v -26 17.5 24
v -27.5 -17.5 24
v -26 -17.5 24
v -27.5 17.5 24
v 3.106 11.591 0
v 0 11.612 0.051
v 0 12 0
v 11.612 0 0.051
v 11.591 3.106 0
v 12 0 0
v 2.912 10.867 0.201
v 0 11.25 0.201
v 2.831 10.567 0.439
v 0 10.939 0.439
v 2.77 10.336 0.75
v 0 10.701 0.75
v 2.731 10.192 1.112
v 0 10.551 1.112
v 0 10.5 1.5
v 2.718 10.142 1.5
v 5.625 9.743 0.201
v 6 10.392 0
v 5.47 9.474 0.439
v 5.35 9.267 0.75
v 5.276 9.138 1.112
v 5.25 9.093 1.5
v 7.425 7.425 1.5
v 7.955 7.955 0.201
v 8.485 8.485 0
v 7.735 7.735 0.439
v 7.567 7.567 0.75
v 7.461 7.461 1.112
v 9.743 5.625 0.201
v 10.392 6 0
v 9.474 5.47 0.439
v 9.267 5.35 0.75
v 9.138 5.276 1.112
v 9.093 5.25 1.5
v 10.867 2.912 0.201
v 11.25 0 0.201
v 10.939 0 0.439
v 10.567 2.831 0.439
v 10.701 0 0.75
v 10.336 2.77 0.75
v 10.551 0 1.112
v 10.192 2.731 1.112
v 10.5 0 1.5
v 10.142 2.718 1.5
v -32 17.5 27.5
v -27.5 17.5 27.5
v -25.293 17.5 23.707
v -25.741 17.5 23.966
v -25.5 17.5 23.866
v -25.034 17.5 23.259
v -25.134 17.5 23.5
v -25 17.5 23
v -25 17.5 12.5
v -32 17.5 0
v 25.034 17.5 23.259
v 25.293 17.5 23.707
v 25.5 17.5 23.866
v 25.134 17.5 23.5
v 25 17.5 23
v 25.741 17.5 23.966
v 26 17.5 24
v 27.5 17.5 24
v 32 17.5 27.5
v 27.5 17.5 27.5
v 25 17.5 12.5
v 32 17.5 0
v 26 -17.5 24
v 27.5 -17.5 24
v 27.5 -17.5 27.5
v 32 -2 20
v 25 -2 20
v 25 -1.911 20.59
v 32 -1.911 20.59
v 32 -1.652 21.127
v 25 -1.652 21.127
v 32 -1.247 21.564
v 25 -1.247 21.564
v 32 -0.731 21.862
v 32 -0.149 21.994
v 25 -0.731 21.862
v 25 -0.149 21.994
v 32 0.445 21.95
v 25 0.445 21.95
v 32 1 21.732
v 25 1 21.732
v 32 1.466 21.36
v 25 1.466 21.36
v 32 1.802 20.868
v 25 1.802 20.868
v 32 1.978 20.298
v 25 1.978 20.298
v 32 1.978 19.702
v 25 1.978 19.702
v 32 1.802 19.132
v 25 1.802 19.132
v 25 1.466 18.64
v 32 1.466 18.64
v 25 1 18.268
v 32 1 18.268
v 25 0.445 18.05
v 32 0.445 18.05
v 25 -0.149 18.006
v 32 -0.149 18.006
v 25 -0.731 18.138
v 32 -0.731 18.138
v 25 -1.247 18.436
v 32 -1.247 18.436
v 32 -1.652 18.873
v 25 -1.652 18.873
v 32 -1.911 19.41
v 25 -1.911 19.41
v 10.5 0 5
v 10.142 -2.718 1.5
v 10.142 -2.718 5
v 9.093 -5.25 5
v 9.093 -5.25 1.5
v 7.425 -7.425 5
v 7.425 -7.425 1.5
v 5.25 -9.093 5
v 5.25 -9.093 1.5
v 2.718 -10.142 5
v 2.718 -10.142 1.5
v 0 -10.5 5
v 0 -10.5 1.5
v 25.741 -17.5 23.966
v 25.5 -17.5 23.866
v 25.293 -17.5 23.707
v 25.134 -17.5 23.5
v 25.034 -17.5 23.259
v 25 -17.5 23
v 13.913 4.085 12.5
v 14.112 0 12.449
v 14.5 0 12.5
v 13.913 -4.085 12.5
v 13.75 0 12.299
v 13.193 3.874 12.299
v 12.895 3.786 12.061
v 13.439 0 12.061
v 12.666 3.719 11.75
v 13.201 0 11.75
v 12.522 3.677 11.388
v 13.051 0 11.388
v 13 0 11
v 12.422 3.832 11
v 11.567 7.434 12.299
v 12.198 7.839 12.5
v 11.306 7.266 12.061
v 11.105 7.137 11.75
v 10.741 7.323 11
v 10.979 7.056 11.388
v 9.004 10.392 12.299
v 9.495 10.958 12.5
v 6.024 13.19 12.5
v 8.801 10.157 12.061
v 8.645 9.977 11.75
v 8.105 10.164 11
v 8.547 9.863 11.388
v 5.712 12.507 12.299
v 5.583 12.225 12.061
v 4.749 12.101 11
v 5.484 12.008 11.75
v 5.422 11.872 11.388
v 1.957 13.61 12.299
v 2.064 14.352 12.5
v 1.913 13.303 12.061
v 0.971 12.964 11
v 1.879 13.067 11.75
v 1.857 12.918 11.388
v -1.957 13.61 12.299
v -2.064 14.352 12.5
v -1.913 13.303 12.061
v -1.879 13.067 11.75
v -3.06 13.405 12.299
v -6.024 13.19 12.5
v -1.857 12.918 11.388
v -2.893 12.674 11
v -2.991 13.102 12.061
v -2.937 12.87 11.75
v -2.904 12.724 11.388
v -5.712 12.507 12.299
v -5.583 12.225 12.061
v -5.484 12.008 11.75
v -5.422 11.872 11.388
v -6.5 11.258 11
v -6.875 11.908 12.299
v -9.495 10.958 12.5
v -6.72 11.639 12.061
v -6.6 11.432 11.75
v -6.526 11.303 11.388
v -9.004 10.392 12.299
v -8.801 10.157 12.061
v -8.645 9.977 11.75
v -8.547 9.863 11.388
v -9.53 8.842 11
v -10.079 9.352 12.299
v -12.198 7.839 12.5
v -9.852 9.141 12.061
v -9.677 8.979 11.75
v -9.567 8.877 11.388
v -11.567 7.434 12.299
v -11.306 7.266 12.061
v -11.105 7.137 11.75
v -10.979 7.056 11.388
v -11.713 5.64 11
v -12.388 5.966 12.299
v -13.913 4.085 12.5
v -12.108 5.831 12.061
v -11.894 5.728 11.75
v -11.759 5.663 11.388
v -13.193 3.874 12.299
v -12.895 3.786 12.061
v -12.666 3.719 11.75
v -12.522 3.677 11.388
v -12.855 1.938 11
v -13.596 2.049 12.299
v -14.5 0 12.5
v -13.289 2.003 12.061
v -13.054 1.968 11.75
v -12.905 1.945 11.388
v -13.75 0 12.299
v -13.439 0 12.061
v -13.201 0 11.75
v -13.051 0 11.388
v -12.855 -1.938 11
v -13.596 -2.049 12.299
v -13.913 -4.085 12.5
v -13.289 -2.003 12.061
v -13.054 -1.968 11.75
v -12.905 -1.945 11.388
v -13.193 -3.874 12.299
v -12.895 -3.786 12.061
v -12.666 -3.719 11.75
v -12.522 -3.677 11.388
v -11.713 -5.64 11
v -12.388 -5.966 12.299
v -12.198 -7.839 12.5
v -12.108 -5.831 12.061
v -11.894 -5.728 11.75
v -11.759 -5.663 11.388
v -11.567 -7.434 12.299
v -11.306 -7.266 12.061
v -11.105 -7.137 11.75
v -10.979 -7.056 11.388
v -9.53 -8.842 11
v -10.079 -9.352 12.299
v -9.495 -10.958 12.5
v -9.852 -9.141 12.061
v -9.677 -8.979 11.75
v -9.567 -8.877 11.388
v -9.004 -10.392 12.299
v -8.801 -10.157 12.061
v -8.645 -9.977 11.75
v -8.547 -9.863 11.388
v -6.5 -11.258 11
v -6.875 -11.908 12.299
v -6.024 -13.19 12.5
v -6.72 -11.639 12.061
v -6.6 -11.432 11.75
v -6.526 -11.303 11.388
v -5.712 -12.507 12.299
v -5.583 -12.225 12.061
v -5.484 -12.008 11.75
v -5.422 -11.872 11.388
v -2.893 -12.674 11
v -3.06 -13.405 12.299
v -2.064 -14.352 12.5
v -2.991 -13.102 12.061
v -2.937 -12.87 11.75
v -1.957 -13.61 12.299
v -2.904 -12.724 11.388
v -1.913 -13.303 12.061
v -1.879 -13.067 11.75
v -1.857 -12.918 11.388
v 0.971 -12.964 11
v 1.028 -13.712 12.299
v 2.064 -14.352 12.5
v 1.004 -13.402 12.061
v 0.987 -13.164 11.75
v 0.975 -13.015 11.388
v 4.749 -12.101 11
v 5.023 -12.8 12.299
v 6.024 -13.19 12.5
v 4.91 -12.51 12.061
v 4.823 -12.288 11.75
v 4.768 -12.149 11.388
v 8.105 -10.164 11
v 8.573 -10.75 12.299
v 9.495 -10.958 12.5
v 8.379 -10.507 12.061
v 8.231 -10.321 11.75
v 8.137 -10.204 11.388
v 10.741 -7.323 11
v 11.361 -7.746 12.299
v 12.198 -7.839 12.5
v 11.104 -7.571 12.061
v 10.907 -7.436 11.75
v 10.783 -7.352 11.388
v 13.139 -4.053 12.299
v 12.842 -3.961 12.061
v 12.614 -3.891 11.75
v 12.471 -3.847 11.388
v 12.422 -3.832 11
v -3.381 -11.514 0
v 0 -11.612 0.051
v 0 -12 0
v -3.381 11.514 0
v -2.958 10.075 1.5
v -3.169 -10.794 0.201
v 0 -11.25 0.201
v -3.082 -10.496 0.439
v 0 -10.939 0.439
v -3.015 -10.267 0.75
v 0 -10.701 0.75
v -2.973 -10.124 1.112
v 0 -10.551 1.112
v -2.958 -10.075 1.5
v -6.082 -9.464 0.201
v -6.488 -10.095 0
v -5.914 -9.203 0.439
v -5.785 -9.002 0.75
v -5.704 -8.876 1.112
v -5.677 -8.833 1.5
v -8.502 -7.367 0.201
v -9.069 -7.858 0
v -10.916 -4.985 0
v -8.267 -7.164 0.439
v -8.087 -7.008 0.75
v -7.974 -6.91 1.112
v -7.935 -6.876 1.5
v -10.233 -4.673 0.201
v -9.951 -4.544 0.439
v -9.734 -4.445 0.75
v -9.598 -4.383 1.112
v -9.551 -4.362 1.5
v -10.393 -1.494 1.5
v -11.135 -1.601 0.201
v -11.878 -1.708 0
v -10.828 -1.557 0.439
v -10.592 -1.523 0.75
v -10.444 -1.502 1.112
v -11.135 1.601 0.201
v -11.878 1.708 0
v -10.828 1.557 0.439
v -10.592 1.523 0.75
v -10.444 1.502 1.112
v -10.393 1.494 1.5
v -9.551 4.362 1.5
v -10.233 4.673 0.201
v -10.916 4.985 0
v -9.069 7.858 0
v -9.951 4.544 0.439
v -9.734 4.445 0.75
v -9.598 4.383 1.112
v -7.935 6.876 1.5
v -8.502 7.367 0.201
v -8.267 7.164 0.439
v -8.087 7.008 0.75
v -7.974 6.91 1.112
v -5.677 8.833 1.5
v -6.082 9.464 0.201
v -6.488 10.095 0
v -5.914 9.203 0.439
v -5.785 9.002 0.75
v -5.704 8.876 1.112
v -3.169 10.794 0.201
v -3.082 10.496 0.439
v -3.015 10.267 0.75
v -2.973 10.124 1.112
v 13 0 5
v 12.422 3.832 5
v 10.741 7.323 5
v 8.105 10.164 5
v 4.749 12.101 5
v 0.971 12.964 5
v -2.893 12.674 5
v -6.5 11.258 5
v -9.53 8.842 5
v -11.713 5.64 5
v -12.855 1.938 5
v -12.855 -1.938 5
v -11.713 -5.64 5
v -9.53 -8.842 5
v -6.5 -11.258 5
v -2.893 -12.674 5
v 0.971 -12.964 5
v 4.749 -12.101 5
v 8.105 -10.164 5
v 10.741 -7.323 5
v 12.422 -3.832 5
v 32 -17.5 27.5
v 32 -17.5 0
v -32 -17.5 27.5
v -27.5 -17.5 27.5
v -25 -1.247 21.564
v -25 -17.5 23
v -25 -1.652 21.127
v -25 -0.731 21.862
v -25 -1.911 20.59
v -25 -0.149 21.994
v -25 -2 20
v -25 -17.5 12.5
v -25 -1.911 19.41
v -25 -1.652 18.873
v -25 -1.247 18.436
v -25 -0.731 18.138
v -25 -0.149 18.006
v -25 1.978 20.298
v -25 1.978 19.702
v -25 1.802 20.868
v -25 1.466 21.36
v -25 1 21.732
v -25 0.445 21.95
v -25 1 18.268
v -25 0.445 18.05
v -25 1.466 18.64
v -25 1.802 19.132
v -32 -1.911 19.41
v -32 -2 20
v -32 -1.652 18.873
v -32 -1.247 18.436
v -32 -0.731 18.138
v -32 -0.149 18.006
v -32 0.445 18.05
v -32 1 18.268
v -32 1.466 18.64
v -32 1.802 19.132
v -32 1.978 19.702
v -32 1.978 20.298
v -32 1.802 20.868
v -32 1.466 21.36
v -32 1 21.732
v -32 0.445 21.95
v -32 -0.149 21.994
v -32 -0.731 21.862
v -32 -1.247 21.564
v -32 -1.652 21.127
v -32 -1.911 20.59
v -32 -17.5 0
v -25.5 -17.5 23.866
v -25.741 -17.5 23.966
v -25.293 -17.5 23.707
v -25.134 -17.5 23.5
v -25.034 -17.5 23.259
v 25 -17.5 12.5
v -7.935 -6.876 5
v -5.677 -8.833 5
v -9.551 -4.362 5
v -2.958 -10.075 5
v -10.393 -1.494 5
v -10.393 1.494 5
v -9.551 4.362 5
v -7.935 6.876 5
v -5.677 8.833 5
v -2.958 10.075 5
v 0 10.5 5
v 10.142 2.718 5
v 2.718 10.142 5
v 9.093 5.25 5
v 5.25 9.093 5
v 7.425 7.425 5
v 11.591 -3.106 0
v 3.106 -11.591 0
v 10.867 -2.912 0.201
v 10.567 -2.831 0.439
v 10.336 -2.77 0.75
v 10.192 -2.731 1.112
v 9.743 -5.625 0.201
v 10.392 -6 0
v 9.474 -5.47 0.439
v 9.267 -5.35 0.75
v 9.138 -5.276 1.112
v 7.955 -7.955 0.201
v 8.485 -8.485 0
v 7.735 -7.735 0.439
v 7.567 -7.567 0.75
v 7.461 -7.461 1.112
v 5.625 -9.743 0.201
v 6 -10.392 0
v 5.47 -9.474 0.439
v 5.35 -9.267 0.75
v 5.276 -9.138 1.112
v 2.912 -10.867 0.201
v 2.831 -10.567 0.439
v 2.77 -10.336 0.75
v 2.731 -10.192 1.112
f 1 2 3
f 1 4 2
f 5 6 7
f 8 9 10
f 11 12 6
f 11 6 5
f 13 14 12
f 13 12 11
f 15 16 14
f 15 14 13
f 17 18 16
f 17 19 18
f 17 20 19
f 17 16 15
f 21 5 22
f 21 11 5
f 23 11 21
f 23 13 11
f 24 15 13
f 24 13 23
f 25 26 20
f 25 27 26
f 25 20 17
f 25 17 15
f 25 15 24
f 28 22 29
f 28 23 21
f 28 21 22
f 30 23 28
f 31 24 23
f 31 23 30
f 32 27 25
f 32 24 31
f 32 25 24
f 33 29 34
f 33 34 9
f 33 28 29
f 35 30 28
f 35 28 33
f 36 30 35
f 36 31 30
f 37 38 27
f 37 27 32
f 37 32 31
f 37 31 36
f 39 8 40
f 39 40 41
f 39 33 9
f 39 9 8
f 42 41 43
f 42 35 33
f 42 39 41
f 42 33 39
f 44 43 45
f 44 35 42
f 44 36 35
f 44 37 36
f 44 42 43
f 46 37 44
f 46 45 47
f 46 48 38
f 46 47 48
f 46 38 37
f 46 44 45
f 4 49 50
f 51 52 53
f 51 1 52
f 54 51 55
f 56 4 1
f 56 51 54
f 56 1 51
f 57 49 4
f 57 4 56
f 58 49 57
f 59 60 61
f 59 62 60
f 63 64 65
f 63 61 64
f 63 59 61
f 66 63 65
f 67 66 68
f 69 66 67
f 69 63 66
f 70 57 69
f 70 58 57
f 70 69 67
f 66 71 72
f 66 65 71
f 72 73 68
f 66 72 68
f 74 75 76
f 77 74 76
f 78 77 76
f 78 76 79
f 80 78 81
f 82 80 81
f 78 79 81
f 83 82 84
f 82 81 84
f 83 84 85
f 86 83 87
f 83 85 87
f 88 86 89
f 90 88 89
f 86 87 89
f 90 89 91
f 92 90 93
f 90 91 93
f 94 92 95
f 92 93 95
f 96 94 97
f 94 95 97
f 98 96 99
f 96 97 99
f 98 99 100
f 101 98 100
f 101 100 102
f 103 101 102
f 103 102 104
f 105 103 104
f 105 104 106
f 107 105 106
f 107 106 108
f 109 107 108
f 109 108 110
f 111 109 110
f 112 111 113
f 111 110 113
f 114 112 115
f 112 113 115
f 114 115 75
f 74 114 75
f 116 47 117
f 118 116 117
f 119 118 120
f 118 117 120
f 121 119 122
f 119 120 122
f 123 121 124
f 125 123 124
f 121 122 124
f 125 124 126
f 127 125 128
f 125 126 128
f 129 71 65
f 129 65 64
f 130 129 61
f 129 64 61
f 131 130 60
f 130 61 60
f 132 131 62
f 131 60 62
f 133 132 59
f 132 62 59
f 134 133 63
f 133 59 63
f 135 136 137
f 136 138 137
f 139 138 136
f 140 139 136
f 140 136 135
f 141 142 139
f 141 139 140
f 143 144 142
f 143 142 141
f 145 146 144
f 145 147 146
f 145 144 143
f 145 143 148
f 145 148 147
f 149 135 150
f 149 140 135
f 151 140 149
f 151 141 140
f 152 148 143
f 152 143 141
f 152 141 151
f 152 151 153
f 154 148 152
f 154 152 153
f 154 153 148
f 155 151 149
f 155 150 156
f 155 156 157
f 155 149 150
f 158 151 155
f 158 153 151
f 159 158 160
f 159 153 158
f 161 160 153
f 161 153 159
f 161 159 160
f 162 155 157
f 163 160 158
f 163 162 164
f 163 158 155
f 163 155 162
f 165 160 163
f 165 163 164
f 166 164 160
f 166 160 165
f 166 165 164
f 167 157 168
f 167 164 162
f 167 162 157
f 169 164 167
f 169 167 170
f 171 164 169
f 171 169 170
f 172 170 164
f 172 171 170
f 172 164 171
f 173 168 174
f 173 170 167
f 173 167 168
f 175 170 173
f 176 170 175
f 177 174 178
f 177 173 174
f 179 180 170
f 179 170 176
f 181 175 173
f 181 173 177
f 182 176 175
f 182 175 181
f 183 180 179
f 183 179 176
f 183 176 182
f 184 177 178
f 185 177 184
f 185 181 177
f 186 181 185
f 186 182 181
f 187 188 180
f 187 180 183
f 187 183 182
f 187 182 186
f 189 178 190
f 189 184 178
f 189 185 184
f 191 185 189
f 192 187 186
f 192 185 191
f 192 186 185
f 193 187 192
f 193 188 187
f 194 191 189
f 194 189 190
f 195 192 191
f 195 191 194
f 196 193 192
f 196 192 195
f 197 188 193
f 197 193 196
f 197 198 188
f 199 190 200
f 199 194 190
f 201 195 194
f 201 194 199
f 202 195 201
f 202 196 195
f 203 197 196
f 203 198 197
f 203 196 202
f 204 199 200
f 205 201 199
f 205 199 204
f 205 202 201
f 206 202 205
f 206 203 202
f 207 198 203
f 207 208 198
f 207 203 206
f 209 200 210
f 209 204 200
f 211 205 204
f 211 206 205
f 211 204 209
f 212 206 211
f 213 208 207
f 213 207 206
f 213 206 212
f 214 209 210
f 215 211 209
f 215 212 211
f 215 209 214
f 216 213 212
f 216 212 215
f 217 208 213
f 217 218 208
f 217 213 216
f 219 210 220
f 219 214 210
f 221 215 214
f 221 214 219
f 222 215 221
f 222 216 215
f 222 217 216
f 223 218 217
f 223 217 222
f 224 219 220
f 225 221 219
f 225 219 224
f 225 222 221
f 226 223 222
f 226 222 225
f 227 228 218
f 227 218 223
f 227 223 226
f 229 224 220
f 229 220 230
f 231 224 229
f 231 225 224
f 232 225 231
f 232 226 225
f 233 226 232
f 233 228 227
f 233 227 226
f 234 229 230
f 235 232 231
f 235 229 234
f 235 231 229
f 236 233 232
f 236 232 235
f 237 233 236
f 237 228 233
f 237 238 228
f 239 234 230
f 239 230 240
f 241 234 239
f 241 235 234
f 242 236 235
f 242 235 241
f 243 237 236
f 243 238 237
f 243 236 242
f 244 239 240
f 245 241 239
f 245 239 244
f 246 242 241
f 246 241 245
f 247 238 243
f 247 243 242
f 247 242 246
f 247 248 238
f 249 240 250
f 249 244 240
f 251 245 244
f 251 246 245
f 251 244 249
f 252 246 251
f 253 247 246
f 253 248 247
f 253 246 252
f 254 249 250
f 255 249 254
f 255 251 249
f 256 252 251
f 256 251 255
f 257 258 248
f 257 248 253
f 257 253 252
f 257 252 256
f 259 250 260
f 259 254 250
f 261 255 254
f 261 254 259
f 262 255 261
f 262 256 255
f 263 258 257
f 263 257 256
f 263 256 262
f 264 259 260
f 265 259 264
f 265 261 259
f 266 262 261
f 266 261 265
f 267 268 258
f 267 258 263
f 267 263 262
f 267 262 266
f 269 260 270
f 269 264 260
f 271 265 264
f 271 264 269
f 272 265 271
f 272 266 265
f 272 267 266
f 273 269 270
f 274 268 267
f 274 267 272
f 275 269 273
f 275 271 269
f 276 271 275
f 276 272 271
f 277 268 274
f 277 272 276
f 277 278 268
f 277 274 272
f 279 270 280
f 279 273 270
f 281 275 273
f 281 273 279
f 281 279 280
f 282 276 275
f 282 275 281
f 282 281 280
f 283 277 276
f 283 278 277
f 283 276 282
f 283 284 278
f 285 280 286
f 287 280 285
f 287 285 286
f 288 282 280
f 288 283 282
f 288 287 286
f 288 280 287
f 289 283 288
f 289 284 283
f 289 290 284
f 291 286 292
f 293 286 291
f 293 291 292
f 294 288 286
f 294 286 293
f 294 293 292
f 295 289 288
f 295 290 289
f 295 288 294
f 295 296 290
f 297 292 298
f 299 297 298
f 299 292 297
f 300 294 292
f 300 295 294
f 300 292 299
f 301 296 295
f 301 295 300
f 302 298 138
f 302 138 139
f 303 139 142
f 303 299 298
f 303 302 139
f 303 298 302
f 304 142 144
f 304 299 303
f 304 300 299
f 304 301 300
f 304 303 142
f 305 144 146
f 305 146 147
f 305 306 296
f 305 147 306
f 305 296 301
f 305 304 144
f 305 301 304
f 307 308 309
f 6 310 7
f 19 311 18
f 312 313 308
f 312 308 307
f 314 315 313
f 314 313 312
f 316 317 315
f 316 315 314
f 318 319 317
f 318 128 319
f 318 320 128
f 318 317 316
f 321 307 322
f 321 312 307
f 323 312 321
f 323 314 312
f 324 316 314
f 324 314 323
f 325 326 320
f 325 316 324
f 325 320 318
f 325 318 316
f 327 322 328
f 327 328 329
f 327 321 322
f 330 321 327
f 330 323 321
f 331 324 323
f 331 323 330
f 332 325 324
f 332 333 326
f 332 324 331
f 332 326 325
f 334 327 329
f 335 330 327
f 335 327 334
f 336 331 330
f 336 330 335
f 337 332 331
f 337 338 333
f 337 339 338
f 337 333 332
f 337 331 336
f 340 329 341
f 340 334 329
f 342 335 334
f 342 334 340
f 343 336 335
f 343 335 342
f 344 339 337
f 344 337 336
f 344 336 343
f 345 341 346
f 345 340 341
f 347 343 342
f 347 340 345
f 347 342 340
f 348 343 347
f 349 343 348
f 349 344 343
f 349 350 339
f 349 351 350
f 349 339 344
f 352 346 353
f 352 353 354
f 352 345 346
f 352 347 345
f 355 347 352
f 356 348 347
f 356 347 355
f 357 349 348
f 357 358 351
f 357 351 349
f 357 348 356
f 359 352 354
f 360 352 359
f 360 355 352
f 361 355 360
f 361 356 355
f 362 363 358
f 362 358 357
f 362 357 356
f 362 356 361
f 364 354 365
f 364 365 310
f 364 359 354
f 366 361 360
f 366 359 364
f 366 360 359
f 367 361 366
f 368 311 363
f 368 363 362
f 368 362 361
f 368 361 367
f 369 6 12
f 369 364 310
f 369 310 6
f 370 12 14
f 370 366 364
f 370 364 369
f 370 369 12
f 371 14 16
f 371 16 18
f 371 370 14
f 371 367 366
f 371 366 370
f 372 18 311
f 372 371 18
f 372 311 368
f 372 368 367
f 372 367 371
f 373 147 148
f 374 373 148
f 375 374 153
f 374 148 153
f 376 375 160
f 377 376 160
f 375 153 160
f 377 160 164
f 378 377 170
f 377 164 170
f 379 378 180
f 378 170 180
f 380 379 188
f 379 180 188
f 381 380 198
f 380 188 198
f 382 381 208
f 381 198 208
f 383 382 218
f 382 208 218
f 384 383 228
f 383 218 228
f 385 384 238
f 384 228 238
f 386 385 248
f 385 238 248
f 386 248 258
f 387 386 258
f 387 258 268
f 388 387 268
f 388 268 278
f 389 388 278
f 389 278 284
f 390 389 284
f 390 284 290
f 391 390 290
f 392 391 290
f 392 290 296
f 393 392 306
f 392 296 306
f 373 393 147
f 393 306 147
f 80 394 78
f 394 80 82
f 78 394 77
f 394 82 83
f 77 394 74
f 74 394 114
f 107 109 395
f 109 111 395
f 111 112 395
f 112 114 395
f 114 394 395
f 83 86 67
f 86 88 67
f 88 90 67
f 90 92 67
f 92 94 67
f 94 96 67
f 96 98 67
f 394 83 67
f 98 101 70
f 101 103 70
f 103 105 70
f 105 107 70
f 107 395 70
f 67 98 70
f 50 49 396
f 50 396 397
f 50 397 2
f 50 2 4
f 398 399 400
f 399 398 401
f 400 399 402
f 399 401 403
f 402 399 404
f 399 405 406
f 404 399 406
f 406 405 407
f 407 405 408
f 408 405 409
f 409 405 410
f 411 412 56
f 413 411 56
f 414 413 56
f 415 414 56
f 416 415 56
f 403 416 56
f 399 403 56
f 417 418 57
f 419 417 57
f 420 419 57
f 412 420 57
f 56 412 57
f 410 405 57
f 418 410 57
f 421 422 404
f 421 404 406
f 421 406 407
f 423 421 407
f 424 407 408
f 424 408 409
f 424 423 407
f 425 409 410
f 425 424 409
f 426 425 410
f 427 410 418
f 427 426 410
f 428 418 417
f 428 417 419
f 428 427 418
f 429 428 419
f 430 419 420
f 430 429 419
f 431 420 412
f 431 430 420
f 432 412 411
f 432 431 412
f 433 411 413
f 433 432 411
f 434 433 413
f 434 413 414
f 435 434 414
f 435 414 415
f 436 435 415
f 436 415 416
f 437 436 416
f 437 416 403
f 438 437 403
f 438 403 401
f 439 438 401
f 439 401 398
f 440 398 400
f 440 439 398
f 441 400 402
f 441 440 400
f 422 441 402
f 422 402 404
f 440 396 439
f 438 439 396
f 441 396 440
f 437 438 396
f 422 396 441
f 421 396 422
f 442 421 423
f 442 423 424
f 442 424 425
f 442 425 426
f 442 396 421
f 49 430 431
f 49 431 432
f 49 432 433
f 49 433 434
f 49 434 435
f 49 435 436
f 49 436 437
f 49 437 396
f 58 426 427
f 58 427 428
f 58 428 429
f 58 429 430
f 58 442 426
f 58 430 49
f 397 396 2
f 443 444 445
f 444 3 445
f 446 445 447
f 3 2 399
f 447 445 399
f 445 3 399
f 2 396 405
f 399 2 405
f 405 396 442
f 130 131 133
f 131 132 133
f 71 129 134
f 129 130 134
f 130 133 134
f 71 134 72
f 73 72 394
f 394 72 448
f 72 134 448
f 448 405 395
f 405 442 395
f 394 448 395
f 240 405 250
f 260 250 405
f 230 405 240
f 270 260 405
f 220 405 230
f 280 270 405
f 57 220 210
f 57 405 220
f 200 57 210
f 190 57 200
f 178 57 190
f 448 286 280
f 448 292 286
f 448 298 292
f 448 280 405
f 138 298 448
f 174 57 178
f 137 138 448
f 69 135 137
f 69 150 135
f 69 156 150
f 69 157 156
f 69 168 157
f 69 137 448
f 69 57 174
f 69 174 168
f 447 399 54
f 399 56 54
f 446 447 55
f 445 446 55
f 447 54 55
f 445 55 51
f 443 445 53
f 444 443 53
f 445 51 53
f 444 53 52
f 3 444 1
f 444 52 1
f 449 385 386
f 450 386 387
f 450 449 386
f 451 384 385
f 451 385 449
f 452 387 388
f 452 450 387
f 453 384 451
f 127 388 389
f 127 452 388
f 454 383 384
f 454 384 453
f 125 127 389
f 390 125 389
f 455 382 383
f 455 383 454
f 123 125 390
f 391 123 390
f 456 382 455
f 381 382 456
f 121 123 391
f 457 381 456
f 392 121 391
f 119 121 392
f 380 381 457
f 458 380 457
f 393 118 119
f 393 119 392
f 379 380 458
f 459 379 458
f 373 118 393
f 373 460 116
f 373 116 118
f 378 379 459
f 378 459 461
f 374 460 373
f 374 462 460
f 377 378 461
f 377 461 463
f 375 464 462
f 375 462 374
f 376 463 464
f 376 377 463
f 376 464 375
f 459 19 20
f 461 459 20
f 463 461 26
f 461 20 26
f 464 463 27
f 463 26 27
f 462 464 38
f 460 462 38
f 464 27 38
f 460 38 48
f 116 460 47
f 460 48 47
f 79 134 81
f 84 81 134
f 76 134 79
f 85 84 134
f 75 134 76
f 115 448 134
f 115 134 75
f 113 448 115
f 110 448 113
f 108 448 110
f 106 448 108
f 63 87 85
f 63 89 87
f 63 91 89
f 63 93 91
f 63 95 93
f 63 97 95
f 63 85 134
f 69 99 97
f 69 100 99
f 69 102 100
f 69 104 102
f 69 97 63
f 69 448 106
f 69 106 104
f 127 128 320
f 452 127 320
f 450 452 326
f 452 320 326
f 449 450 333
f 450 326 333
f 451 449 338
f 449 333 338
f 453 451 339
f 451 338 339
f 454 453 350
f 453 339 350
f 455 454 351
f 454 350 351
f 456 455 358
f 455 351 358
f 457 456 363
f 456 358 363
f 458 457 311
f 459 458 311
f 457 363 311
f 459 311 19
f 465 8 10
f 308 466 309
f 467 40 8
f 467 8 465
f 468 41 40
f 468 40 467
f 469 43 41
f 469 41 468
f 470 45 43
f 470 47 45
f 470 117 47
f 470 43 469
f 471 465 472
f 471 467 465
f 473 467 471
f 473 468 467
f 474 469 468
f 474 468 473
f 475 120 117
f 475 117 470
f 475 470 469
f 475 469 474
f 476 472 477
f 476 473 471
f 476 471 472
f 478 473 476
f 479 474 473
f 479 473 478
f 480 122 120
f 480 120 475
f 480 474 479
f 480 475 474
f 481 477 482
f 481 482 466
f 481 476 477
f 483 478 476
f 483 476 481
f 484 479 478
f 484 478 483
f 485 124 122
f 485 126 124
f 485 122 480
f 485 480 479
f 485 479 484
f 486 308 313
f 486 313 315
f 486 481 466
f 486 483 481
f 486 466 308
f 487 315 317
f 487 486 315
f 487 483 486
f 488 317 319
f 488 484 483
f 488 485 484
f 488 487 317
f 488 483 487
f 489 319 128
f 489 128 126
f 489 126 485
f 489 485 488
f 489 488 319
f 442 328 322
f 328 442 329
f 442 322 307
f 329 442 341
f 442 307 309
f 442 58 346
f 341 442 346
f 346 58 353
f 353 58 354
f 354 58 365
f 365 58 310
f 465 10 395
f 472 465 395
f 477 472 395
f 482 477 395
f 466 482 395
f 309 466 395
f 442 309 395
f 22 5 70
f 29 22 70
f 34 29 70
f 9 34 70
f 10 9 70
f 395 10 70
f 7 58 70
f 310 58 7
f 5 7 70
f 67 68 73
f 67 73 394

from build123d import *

# Parameters (mm, degrees)
DODANIE_WYCI_GNI_CIE1_DEPTH = 12.5
SZKIC3_R                    = 13
WYTNIJ_WYCI_GNI_CIE1_DEPTH  = 7.5
SZKIC4_W                    = 7
SZKIC4_H                    = 35
DODANIE_WYCI_GNI_CIE2_DEPTH = 15
SZKIC6_R                    = 2
WYTNIJ_WYCI_GNI_CIE2_DEPTH  = 7
WYTNIJ_WYCI_GNI_CIE3_START  = -7
SZKIC7_R                    = 2
WYTNIJ_WYCI_GNI_CIE3_DEPTH  = 7
ZAOKR_GLENIE2_R             = 1.5
ZAOKR_GLENIE3_R             = 1.5
SZKIC8_W                    = 2.5
SZKIC8_H                    = 35
WYTNIJ_WYCI_GNI_CIE4_DEPTH  = 3.5
ZAOKR_GLENIE4_R             = 1


with BuildPart() as part:
    # Szkic2 → Dodanie-wyciągnięcie1 (new body)
    with BuildSketch(Plane.XY):
        with BuildLine():
            ThreePointArc((0, -10.5), (-10.5, 0), (0, 10.5))
            Line((0, 10.5), (-32, 10.5))
            Line((-32, 10.5), (-32, -10.5))
            Line((-32, -10.5), (0, -10.5))
        make_face()
        with BuildLine():
            Line((32, 10.5), (0, 10.5))
            ThreePointArc((0, 10.5), (7.424621202, 7.424621202), (10.5, 0))
            ThreePointArc((10.5, 0), (7.424621202, -7.424621202), (0, -10.5))
            Line((0, -10.5), (32, -10.5))
            Line((32, -10.5), (32, 10.5))
        make_face()
        Polygon((0, 10.5), (32, 10.5), (32, 17.5), (-32, 17.5), (-32, 10.5), align=None)
        Polygon((32, -10.5), (32, -17.5), (-32, -17.5), (-32, -10.5), (0, -10.5), align=None)
    extrude(amount=DODANIE_WYCI_GNI_CIE1_DEPTH)

    # Szkic3 → Wytnij-wyciągnięcie1 (cut)
    with BuildSketch(Plane.XY.offset(12.5)):
        Circle(SZKIC3_R)
    extrude(amount=-WYTNIJ_WYCI_GNI_CIE1_DEPTH, mode=Mode.SUBTRACT)

    # Szkic4 → Dodanie-wyciągnięcie2 (add)
    with BuildSketch(Plane.XY.offset(12.5)):
        with Locations((-28.5, 0)):
            Rectangle(SZKIC4_W, SZKIC4_H)
        with Locations((28.5, 0)):
            Rectangle(SZKIC4_W, SZKIC4_H)
    extrude(amount=DODANIE_WYCI_GNI_CIE2_DEPTH)

    # Szkic6 → Wytnij-wyciągnięcie2 (cut)
    with BuildSketch(Plane.ZY.offset(-25)):
        with Locations(Location((20, 0, 0), (0, 0, 270))):
            Circle(SZKIC6_R)
    extrude(amount=-WYTNIJ_WYCI_GNI_CIE2_DEPTH, mode=Mode.SUBTRACT)

    # Szkic7 → Wytnij-wyciągnięcie3 (cut)
    with BuildSketch(Plane(origin=(-25, 0, 0), x_dir=(0, 0, -1), z_dir=(1, 0, 0)).offset(WYTNIJ_WYCI_GNI_CIE3_START)):
        with Locations(Location((-20, 0, 0), (0, 0, 270))):
            Circle(SZKIC7_R)
    extrude(amount=WYTNIJ_WYCI_GNI_CIE3_DEPTH, mode=Mode.SUBTRACT)

    # Zaokrąglenie2
    zaokr_glenie2_edges = [part.edges().sort_by_distance(p)[0] for p in [
        (-13, 0, 12.5),
    ]]
    fillet(zaokr_glenie2_edges, radius=ZAOKR_GLENIE2_R)

    # Zaokrąglenie3
    zaokr_glenie3_edges = [part.edges().sort_by_distance(p)[0] for p in [
        (0, 10.5, 0),
    ]]
    fillet(zaokr_glenie3_edges, radius=ZAOKR_GLENIE3_R)

    # Szkic8 → Wytnij-wyciągnięcie4 (cut)
    with BuildSketch(Plane.XY.offset(27.5)):
        with Locations((-26.25, 0)):
            Rectangle(SZKIC8_W, SZKIC8_H)
        with Locations((26.25, 0)):
            Rectangle(SZKIC8_W, SZKIC8_H)
    extrude(amount=-WYTNIJ_WYCI_GNI_CIE4_DEPTH, mode=Mode.SUBTRACT)

    # Zaokrąglenie4
    zaokr_glenie4_edges = [part.edges().sort_by_distance(p)[0] for p in [
        (-25, 0, 24),
        (25, 0, 24),
    ]]
    fillet(zaokr_glenie4_edges, radius=ZAOKR_GLENIE4_R)


solid = part.part
